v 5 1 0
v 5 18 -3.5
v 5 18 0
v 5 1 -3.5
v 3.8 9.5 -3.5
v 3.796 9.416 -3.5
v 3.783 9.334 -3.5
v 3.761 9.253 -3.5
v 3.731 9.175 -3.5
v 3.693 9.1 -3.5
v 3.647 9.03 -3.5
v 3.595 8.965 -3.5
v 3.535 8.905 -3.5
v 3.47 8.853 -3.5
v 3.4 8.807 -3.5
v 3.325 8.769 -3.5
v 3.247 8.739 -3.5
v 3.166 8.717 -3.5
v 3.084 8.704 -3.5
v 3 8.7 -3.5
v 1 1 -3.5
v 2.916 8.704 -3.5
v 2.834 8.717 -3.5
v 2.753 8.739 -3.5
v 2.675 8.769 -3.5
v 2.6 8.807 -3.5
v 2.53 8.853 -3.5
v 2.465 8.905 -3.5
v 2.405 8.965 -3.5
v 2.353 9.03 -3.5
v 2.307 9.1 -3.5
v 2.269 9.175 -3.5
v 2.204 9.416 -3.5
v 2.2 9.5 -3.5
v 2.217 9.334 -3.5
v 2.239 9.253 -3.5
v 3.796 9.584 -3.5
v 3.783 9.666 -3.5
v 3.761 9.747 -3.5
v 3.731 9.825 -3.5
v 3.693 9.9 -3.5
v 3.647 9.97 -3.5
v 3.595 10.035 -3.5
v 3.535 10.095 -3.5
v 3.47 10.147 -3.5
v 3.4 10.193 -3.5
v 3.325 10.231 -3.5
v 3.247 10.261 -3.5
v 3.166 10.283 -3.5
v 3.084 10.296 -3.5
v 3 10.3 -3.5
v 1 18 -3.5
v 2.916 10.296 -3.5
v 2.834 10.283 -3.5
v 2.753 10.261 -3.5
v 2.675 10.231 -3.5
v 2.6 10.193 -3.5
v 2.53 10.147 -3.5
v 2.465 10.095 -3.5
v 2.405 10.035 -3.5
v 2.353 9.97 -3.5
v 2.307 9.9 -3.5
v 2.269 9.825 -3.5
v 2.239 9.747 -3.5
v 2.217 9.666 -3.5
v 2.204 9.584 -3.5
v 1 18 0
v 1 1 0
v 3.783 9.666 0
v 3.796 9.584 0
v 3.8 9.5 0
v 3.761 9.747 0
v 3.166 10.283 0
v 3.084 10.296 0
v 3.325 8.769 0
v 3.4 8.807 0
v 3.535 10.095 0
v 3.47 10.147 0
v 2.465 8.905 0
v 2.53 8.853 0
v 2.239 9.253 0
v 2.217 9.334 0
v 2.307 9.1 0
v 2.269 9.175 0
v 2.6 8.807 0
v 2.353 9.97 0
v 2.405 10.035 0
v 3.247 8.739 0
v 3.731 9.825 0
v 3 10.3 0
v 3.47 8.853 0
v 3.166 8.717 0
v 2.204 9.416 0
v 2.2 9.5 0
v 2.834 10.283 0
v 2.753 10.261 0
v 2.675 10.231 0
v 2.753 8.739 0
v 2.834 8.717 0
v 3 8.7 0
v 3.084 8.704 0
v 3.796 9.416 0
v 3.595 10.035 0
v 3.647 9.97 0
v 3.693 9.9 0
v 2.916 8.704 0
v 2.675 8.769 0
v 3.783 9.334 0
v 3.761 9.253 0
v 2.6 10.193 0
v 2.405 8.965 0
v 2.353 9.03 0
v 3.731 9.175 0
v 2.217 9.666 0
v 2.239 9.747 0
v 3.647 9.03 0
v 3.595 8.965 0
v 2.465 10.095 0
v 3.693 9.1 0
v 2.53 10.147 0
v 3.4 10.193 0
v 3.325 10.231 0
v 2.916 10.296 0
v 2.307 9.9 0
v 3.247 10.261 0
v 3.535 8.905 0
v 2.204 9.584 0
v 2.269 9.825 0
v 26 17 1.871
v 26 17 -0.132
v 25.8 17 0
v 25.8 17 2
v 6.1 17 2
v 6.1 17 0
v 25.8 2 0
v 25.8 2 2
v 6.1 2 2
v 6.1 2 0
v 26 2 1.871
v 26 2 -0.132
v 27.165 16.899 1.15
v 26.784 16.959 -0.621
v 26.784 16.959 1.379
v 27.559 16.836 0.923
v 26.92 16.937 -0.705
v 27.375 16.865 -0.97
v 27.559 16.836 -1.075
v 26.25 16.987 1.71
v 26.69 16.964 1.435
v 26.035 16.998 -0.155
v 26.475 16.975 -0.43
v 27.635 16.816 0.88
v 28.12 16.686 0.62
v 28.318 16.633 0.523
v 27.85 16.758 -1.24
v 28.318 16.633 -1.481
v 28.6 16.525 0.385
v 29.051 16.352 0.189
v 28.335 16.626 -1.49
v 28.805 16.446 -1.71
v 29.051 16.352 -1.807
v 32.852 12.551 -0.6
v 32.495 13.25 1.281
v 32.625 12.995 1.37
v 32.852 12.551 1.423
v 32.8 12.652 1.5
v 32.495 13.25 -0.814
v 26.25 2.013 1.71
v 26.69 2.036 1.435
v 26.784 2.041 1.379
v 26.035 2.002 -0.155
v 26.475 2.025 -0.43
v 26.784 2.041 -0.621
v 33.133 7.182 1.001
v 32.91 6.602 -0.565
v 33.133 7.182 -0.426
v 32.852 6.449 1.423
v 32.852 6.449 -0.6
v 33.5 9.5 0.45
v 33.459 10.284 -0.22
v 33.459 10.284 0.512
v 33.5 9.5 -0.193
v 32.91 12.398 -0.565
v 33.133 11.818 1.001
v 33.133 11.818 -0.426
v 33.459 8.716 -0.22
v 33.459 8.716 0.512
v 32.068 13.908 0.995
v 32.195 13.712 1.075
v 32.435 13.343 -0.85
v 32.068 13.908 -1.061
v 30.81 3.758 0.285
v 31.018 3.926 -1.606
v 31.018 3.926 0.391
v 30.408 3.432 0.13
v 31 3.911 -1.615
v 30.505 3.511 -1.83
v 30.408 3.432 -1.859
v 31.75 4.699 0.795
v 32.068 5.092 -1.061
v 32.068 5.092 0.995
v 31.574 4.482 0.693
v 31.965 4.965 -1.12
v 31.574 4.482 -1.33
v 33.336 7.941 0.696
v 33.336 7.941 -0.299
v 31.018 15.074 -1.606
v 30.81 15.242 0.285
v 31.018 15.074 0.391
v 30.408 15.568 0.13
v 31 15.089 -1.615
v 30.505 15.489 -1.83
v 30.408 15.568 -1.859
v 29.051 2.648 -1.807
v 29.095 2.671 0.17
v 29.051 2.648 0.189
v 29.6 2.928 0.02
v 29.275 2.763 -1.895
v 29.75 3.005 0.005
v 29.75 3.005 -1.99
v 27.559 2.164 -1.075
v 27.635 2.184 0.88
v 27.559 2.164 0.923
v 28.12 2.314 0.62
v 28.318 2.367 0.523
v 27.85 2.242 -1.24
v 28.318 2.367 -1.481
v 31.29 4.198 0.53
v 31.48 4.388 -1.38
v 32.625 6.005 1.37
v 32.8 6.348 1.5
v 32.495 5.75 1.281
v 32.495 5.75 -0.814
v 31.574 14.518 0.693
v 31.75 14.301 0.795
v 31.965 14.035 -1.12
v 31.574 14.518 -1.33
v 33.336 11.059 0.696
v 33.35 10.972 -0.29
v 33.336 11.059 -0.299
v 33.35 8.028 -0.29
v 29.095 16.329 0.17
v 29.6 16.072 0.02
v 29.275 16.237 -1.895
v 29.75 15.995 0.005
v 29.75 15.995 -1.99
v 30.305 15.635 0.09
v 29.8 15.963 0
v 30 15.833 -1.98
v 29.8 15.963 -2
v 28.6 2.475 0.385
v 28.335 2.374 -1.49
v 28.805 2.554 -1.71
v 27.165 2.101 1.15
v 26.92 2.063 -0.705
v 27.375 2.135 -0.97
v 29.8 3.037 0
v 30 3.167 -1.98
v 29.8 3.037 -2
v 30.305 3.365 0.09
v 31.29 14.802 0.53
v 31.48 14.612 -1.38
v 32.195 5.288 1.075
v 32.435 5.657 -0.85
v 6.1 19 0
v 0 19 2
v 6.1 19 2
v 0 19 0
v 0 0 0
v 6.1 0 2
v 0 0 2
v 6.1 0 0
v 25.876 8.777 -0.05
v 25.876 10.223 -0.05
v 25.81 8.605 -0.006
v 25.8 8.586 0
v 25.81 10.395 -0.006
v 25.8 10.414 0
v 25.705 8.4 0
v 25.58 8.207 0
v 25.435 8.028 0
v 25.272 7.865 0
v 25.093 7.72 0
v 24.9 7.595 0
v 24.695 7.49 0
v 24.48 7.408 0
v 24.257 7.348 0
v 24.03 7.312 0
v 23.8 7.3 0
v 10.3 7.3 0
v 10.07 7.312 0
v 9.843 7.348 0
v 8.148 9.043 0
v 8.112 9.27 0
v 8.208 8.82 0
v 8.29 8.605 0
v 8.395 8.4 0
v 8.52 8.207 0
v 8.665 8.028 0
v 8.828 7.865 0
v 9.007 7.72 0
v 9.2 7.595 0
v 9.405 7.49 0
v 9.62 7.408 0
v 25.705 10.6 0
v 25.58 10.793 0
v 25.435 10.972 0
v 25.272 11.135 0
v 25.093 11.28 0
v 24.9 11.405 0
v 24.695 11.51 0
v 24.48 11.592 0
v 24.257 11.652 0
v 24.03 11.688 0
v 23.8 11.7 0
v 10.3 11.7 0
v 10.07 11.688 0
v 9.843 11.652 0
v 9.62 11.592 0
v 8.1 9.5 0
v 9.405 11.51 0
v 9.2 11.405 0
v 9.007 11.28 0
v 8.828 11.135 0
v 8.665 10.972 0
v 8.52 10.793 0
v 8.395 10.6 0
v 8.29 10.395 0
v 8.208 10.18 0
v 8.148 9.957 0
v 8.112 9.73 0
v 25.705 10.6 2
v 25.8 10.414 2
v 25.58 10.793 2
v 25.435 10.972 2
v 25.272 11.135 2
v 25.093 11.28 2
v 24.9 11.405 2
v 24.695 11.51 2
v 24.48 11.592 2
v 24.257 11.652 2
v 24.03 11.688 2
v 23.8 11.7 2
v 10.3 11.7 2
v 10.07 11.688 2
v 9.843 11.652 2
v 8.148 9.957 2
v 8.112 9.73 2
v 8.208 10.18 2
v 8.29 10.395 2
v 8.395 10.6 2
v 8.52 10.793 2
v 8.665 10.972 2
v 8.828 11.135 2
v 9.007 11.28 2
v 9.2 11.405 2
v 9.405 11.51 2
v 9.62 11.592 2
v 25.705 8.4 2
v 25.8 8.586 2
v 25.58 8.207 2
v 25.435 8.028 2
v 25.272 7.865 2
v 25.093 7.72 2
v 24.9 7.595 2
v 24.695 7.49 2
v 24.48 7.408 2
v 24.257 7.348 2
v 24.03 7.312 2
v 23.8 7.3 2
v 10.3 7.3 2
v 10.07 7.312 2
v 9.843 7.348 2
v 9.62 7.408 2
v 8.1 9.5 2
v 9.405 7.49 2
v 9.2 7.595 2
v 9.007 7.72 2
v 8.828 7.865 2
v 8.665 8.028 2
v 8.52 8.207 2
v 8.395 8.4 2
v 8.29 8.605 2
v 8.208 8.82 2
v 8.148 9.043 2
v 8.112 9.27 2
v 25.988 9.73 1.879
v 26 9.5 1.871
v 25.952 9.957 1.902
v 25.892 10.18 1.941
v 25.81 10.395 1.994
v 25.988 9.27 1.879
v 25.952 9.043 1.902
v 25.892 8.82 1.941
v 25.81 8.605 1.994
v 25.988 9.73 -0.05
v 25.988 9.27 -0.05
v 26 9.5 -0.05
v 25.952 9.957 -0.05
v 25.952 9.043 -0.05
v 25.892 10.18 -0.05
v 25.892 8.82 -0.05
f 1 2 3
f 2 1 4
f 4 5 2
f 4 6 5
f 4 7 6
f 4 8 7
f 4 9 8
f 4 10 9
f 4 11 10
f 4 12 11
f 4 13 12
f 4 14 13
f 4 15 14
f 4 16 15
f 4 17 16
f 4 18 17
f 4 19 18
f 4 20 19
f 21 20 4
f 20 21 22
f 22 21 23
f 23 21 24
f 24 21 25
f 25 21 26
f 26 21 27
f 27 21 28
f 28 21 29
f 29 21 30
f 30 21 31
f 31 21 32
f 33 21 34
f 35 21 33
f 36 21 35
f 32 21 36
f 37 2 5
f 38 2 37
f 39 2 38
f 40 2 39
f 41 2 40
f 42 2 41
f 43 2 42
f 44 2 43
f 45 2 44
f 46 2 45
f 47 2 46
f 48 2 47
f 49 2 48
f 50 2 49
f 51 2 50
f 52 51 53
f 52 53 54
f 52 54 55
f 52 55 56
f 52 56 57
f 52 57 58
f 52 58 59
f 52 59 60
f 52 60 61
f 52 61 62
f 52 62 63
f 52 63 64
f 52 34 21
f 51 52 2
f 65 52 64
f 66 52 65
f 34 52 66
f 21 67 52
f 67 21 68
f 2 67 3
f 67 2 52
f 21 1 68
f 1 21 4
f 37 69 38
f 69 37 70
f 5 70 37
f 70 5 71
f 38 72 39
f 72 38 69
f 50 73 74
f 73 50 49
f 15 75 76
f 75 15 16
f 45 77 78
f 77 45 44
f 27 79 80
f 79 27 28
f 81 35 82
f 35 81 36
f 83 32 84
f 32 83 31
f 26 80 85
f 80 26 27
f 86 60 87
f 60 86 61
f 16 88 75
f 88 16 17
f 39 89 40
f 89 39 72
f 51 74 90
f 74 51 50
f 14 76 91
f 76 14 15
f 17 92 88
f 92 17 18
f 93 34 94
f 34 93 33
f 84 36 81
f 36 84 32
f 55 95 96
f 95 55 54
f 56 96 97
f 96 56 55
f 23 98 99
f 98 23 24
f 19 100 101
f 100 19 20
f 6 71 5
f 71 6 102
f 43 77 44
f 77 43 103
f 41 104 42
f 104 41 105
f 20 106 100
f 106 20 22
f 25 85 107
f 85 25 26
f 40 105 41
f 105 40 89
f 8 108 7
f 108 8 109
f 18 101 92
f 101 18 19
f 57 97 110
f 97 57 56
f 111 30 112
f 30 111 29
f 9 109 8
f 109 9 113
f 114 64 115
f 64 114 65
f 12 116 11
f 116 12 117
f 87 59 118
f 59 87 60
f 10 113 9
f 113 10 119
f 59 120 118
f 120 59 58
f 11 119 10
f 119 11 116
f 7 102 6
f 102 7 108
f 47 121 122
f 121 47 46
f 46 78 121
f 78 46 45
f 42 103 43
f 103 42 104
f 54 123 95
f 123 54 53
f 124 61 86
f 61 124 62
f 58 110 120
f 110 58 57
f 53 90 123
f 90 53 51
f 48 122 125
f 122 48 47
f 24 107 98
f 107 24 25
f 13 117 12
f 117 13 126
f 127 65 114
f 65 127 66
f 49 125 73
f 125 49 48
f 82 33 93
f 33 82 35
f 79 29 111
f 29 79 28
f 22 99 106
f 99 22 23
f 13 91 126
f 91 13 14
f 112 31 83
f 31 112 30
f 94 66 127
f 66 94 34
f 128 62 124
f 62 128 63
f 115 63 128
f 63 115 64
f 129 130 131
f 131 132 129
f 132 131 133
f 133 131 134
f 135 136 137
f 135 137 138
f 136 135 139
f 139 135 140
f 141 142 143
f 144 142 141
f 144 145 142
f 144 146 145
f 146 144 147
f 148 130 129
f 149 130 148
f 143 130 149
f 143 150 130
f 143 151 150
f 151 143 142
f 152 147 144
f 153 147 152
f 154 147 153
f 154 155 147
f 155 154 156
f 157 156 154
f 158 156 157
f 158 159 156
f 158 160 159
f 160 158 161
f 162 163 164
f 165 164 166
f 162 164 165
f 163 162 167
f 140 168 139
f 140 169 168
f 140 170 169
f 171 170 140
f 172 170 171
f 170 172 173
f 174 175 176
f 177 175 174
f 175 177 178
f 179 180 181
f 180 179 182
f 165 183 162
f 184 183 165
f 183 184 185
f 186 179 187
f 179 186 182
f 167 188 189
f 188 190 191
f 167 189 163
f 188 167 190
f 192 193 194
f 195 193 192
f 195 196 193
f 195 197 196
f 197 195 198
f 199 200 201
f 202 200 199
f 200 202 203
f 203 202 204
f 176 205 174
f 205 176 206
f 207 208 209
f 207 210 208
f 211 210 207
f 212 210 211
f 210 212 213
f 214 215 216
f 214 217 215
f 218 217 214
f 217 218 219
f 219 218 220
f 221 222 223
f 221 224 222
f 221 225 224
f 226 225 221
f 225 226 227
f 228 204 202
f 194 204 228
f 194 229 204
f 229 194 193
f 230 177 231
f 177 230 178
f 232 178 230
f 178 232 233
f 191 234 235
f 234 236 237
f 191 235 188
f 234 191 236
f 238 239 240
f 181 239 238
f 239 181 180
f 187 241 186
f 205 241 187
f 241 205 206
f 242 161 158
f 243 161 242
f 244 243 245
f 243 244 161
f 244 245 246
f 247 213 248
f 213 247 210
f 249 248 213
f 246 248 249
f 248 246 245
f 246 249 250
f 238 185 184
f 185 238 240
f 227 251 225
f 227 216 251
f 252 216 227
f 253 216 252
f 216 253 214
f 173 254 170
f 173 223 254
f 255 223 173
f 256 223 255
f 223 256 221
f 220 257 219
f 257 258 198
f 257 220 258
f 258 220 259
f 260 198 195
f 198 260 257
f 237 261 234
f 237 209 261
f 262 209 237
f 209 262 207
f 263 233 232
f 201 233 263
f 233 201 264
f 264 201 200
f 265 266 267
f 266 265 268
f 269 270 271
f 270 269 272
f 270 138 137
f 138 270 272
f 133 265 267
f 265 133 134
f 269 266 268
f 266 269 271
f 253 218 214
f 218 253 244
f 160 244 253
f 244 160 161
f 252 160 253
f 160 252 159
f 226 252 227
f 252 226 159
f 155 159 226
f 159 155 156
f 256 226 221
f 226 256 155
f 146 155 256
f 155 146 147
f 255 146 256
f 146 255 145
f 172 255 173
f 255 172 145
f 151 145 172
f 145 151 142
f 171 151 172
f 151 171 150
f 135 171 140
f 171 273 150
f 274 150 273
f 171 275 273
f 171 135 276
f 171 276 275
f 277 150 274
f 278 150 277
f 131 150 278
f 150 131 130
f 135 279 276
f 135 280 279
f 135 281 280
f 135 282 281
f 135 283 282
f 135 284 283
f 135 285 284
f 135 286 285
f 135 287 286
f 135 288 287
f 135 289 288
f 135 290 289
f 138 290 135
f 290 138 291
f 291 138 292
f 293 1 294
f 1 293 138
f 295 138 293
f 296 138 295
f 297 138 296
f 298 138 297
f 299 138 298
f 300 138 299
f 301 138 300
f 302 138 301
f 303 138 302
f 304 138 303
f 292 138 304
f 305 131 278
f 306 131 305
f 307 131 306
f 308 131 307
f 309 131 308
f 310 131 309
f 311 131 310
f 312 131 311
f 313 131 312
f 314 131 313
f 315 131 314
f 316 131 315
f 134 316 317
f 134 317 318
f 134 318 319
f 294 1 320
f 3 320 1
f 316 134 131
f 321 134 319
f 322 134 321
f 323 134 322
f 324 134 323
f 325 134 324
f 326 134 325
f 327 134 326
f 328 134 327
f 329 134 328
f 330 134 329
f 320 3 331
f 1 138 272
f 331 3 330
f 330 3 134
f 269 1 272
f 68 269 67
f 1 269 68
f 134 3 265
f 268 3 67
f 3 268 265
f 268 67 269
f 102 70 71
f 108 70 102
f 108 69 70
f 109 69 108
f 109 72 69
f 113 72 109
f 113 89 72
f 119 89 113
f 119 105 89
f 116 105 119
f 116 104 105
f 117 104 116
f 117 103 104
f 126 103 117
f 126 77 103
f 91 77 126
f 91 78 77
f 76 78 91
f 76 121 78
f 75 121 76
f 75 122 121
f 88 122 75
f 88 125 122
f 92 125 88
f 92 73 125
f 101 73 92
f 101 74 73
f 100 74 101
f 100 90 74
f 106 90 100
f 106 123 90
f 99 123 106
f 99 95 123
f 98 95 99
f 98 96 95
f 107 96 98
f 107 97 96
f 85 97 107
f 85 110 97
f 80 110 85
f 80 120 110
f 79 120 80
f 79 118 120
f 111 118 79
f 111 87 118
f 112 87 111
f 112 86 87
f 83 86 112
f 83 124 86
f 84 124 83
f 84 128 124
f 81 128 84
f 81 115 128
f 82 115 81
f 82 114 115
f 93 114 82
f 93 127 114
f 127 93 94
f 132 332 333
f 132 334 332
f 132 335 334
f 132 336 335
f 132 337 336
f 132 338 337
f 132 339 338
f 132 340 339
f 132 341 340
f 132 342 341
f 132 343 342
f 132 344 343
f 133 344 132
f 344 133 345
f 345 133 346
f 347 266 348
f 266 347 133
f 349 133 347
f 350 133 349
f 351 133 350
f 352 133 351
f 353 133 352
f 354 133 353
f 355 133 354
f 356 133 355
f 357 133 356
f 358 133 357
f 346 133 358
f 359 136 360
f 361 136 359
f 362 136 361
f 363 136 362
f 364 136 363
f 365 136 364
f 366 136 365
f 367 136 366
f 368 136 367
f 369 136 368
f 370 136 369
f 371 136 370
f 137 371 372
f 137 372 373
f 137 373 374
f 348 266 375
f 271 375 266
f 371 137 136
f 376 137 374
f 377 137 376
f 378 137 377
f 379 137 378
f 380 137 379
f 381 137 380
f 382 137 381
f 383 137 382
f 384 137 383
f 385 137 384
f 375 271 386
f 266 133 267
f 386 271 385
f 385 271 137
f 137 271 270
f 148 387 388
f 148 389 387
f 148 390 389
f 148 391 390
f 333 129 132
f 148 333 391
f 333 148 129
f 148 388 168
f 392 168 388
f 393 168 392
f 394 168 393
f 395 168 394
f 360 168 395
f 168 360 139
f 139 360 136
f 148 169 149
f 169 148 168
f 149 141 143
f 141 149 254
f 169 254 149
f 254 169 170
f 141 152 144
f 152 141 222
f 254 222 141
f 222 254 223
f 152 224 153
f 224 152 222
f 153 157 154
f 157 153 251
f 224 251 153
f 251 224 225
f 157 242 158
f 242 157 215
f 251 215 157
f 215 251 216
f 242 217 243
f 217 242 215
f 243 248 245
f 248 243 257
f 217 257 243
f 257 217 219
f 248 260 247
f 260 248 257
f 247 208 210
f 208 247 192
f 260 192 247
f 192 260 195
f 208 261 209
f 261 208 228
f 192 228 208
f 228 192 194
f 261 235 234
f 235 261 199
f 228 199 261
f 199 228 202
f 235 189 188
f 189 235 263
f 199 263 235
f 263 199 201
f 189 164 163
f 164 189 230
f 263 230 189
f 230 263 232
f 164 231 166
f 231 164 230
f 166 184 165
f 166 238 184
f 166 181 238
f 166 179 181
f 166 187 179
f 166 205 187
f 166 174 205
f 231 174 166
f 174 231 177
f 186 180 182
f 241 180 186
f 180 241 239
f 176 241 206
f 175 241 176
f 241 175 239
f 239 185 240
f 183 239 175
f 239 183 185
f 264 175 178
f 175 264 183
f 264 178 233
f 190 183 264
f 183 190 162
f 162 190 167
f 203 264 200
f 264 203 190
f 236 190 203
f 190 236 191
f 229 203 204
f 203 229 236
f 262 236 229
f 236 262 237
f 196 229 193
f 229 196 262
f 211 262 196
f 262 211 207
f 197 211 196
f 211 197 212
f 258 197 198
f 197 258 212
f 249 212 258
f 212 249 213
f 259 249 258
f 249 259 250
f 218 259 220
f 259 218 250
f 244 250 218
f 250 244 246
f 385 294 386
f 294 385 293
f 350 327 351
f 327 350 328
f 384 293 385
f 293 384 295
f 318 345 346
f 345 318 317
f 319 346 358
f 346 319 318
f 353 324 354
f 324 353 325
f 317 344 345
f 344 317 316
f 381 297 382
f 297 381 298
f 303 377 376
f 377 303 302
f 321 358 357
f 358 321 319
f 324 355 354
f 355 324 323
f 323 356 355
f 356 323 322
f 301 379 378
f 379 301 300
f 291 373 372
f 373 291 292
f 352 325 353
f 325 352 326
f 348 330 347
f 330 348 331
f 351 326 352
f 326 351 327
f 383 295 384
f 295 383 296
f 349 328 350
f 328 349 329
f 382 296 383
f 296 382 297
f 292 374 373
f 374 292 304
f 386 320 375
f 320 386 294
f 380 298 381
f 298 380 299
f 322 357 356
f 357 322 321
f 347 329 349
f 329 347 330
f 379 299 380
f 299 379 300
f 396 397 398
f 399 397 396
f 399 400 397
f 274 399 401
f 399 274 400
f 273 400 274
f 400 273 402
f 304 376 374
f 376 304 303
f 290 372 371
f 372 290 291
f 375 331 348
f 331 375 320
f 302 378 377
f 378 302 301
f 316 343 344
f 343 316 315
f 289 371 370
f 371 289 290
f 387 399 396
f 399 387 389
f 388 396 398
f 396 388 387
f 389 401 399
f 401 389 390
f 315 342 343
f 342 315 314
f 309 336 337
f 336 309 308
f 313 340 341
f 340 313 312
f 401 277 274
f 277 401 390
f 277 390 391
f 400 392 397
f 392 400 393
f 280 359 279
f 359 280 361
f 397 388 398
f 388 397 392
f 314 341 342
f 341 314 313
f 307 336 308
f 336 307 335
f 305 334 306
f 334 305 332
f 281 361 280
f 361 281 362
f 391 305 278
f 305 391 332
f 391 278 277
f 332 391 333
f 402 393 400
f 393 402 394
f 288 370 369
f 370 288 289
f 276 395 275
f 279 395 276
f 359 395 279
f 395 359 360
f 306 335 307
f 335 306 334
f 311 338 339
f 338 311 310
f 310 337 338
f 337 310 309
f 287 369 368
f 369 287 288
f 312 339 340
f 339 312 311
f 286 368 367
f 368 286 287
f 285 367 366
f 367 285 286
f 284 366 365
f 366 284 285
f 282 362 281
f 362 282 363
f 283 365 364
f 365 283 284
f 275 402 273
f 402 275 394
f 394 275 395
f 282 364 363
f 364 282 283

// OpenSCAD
$fn=60;
module sideproj() {
linear_extrude (height=38) 
polygon([[0,0],[52,0],[52,4],[0,4/*1:0,0,0,0*/] ,[-0.9,3.42] ,[-1.78,2.87] ,[-2.73,2.3] ,[-3.67,1.76] ,[-4.64,1.24] ,[-5.6,0.77] ,[-6.59,0.34] ,[-7.6,0.04],[-8,0/*1:2,0,-2,0*/] ,[-9.01,0.18] ,[-10.02,0.57] ,[-10.98,1.06] ,[-11.9,1.59] ,[-12.79,2.15] ,[-13.65,2.74],[-14,3],[-16,0/*1:0,0,0,0*/] ,[-15.1,-0.58] ,[-14.22,-1.13] ,[-13.27,-1.7] ,[-12.33,-2.24] ,[-11.36,-2.76] ,[-10.4,-3.23] ,[-9.41,-3.66] ,[-8.4,-3.96],[-8,-4/*1:-2,0,2,0*/] ,[-6.95,-3.79] ,[-6.01,-3.42] ,[-5.07,-2.98] ,[-4.1,-2.48] ,[-3.15,-1.94] ,[-2.24,-1.41] ,[-1.35,-0.86] ,[-0.47,-0.31]]);
}
module lid(height)
{
    translate([2.2,2.2,0]){
    cylinder (r=2.2, h=height, $fn=60);
    translate([0,-2.2,0])
        cube ([13.5,4.4,height]);
    translate([13.5,0,0])
        cylinder (r=2.2, h=height, $fn=60);
    }
}


module base() {
translate([0,0,4])
rotate([180,0,90])
intersection() {
translate([0,25.8,4])
rotate([90,180,90])
scale([0.5,0.5,0.5])
    sideproj();
    union() {
cube([19,6.1,10]);
translate([2,6,0])
{
cube([15,20,10]);
translate([7.5,20,0])
    cylinder(r=7.5,h=10);
}
}
}
}

translate ([1,1,-3.5])
{
    difference(){
    cube([4,17,3.6]);
    translate([2,8.5,-.1])    
        cylinder(r=0.8, h=4.2);
}
}

difference() {
base();
    translate([26-(4.4+13.5),(19-4.4)/2,-.05])
    lid(2.1);
}
//%lid(2);
